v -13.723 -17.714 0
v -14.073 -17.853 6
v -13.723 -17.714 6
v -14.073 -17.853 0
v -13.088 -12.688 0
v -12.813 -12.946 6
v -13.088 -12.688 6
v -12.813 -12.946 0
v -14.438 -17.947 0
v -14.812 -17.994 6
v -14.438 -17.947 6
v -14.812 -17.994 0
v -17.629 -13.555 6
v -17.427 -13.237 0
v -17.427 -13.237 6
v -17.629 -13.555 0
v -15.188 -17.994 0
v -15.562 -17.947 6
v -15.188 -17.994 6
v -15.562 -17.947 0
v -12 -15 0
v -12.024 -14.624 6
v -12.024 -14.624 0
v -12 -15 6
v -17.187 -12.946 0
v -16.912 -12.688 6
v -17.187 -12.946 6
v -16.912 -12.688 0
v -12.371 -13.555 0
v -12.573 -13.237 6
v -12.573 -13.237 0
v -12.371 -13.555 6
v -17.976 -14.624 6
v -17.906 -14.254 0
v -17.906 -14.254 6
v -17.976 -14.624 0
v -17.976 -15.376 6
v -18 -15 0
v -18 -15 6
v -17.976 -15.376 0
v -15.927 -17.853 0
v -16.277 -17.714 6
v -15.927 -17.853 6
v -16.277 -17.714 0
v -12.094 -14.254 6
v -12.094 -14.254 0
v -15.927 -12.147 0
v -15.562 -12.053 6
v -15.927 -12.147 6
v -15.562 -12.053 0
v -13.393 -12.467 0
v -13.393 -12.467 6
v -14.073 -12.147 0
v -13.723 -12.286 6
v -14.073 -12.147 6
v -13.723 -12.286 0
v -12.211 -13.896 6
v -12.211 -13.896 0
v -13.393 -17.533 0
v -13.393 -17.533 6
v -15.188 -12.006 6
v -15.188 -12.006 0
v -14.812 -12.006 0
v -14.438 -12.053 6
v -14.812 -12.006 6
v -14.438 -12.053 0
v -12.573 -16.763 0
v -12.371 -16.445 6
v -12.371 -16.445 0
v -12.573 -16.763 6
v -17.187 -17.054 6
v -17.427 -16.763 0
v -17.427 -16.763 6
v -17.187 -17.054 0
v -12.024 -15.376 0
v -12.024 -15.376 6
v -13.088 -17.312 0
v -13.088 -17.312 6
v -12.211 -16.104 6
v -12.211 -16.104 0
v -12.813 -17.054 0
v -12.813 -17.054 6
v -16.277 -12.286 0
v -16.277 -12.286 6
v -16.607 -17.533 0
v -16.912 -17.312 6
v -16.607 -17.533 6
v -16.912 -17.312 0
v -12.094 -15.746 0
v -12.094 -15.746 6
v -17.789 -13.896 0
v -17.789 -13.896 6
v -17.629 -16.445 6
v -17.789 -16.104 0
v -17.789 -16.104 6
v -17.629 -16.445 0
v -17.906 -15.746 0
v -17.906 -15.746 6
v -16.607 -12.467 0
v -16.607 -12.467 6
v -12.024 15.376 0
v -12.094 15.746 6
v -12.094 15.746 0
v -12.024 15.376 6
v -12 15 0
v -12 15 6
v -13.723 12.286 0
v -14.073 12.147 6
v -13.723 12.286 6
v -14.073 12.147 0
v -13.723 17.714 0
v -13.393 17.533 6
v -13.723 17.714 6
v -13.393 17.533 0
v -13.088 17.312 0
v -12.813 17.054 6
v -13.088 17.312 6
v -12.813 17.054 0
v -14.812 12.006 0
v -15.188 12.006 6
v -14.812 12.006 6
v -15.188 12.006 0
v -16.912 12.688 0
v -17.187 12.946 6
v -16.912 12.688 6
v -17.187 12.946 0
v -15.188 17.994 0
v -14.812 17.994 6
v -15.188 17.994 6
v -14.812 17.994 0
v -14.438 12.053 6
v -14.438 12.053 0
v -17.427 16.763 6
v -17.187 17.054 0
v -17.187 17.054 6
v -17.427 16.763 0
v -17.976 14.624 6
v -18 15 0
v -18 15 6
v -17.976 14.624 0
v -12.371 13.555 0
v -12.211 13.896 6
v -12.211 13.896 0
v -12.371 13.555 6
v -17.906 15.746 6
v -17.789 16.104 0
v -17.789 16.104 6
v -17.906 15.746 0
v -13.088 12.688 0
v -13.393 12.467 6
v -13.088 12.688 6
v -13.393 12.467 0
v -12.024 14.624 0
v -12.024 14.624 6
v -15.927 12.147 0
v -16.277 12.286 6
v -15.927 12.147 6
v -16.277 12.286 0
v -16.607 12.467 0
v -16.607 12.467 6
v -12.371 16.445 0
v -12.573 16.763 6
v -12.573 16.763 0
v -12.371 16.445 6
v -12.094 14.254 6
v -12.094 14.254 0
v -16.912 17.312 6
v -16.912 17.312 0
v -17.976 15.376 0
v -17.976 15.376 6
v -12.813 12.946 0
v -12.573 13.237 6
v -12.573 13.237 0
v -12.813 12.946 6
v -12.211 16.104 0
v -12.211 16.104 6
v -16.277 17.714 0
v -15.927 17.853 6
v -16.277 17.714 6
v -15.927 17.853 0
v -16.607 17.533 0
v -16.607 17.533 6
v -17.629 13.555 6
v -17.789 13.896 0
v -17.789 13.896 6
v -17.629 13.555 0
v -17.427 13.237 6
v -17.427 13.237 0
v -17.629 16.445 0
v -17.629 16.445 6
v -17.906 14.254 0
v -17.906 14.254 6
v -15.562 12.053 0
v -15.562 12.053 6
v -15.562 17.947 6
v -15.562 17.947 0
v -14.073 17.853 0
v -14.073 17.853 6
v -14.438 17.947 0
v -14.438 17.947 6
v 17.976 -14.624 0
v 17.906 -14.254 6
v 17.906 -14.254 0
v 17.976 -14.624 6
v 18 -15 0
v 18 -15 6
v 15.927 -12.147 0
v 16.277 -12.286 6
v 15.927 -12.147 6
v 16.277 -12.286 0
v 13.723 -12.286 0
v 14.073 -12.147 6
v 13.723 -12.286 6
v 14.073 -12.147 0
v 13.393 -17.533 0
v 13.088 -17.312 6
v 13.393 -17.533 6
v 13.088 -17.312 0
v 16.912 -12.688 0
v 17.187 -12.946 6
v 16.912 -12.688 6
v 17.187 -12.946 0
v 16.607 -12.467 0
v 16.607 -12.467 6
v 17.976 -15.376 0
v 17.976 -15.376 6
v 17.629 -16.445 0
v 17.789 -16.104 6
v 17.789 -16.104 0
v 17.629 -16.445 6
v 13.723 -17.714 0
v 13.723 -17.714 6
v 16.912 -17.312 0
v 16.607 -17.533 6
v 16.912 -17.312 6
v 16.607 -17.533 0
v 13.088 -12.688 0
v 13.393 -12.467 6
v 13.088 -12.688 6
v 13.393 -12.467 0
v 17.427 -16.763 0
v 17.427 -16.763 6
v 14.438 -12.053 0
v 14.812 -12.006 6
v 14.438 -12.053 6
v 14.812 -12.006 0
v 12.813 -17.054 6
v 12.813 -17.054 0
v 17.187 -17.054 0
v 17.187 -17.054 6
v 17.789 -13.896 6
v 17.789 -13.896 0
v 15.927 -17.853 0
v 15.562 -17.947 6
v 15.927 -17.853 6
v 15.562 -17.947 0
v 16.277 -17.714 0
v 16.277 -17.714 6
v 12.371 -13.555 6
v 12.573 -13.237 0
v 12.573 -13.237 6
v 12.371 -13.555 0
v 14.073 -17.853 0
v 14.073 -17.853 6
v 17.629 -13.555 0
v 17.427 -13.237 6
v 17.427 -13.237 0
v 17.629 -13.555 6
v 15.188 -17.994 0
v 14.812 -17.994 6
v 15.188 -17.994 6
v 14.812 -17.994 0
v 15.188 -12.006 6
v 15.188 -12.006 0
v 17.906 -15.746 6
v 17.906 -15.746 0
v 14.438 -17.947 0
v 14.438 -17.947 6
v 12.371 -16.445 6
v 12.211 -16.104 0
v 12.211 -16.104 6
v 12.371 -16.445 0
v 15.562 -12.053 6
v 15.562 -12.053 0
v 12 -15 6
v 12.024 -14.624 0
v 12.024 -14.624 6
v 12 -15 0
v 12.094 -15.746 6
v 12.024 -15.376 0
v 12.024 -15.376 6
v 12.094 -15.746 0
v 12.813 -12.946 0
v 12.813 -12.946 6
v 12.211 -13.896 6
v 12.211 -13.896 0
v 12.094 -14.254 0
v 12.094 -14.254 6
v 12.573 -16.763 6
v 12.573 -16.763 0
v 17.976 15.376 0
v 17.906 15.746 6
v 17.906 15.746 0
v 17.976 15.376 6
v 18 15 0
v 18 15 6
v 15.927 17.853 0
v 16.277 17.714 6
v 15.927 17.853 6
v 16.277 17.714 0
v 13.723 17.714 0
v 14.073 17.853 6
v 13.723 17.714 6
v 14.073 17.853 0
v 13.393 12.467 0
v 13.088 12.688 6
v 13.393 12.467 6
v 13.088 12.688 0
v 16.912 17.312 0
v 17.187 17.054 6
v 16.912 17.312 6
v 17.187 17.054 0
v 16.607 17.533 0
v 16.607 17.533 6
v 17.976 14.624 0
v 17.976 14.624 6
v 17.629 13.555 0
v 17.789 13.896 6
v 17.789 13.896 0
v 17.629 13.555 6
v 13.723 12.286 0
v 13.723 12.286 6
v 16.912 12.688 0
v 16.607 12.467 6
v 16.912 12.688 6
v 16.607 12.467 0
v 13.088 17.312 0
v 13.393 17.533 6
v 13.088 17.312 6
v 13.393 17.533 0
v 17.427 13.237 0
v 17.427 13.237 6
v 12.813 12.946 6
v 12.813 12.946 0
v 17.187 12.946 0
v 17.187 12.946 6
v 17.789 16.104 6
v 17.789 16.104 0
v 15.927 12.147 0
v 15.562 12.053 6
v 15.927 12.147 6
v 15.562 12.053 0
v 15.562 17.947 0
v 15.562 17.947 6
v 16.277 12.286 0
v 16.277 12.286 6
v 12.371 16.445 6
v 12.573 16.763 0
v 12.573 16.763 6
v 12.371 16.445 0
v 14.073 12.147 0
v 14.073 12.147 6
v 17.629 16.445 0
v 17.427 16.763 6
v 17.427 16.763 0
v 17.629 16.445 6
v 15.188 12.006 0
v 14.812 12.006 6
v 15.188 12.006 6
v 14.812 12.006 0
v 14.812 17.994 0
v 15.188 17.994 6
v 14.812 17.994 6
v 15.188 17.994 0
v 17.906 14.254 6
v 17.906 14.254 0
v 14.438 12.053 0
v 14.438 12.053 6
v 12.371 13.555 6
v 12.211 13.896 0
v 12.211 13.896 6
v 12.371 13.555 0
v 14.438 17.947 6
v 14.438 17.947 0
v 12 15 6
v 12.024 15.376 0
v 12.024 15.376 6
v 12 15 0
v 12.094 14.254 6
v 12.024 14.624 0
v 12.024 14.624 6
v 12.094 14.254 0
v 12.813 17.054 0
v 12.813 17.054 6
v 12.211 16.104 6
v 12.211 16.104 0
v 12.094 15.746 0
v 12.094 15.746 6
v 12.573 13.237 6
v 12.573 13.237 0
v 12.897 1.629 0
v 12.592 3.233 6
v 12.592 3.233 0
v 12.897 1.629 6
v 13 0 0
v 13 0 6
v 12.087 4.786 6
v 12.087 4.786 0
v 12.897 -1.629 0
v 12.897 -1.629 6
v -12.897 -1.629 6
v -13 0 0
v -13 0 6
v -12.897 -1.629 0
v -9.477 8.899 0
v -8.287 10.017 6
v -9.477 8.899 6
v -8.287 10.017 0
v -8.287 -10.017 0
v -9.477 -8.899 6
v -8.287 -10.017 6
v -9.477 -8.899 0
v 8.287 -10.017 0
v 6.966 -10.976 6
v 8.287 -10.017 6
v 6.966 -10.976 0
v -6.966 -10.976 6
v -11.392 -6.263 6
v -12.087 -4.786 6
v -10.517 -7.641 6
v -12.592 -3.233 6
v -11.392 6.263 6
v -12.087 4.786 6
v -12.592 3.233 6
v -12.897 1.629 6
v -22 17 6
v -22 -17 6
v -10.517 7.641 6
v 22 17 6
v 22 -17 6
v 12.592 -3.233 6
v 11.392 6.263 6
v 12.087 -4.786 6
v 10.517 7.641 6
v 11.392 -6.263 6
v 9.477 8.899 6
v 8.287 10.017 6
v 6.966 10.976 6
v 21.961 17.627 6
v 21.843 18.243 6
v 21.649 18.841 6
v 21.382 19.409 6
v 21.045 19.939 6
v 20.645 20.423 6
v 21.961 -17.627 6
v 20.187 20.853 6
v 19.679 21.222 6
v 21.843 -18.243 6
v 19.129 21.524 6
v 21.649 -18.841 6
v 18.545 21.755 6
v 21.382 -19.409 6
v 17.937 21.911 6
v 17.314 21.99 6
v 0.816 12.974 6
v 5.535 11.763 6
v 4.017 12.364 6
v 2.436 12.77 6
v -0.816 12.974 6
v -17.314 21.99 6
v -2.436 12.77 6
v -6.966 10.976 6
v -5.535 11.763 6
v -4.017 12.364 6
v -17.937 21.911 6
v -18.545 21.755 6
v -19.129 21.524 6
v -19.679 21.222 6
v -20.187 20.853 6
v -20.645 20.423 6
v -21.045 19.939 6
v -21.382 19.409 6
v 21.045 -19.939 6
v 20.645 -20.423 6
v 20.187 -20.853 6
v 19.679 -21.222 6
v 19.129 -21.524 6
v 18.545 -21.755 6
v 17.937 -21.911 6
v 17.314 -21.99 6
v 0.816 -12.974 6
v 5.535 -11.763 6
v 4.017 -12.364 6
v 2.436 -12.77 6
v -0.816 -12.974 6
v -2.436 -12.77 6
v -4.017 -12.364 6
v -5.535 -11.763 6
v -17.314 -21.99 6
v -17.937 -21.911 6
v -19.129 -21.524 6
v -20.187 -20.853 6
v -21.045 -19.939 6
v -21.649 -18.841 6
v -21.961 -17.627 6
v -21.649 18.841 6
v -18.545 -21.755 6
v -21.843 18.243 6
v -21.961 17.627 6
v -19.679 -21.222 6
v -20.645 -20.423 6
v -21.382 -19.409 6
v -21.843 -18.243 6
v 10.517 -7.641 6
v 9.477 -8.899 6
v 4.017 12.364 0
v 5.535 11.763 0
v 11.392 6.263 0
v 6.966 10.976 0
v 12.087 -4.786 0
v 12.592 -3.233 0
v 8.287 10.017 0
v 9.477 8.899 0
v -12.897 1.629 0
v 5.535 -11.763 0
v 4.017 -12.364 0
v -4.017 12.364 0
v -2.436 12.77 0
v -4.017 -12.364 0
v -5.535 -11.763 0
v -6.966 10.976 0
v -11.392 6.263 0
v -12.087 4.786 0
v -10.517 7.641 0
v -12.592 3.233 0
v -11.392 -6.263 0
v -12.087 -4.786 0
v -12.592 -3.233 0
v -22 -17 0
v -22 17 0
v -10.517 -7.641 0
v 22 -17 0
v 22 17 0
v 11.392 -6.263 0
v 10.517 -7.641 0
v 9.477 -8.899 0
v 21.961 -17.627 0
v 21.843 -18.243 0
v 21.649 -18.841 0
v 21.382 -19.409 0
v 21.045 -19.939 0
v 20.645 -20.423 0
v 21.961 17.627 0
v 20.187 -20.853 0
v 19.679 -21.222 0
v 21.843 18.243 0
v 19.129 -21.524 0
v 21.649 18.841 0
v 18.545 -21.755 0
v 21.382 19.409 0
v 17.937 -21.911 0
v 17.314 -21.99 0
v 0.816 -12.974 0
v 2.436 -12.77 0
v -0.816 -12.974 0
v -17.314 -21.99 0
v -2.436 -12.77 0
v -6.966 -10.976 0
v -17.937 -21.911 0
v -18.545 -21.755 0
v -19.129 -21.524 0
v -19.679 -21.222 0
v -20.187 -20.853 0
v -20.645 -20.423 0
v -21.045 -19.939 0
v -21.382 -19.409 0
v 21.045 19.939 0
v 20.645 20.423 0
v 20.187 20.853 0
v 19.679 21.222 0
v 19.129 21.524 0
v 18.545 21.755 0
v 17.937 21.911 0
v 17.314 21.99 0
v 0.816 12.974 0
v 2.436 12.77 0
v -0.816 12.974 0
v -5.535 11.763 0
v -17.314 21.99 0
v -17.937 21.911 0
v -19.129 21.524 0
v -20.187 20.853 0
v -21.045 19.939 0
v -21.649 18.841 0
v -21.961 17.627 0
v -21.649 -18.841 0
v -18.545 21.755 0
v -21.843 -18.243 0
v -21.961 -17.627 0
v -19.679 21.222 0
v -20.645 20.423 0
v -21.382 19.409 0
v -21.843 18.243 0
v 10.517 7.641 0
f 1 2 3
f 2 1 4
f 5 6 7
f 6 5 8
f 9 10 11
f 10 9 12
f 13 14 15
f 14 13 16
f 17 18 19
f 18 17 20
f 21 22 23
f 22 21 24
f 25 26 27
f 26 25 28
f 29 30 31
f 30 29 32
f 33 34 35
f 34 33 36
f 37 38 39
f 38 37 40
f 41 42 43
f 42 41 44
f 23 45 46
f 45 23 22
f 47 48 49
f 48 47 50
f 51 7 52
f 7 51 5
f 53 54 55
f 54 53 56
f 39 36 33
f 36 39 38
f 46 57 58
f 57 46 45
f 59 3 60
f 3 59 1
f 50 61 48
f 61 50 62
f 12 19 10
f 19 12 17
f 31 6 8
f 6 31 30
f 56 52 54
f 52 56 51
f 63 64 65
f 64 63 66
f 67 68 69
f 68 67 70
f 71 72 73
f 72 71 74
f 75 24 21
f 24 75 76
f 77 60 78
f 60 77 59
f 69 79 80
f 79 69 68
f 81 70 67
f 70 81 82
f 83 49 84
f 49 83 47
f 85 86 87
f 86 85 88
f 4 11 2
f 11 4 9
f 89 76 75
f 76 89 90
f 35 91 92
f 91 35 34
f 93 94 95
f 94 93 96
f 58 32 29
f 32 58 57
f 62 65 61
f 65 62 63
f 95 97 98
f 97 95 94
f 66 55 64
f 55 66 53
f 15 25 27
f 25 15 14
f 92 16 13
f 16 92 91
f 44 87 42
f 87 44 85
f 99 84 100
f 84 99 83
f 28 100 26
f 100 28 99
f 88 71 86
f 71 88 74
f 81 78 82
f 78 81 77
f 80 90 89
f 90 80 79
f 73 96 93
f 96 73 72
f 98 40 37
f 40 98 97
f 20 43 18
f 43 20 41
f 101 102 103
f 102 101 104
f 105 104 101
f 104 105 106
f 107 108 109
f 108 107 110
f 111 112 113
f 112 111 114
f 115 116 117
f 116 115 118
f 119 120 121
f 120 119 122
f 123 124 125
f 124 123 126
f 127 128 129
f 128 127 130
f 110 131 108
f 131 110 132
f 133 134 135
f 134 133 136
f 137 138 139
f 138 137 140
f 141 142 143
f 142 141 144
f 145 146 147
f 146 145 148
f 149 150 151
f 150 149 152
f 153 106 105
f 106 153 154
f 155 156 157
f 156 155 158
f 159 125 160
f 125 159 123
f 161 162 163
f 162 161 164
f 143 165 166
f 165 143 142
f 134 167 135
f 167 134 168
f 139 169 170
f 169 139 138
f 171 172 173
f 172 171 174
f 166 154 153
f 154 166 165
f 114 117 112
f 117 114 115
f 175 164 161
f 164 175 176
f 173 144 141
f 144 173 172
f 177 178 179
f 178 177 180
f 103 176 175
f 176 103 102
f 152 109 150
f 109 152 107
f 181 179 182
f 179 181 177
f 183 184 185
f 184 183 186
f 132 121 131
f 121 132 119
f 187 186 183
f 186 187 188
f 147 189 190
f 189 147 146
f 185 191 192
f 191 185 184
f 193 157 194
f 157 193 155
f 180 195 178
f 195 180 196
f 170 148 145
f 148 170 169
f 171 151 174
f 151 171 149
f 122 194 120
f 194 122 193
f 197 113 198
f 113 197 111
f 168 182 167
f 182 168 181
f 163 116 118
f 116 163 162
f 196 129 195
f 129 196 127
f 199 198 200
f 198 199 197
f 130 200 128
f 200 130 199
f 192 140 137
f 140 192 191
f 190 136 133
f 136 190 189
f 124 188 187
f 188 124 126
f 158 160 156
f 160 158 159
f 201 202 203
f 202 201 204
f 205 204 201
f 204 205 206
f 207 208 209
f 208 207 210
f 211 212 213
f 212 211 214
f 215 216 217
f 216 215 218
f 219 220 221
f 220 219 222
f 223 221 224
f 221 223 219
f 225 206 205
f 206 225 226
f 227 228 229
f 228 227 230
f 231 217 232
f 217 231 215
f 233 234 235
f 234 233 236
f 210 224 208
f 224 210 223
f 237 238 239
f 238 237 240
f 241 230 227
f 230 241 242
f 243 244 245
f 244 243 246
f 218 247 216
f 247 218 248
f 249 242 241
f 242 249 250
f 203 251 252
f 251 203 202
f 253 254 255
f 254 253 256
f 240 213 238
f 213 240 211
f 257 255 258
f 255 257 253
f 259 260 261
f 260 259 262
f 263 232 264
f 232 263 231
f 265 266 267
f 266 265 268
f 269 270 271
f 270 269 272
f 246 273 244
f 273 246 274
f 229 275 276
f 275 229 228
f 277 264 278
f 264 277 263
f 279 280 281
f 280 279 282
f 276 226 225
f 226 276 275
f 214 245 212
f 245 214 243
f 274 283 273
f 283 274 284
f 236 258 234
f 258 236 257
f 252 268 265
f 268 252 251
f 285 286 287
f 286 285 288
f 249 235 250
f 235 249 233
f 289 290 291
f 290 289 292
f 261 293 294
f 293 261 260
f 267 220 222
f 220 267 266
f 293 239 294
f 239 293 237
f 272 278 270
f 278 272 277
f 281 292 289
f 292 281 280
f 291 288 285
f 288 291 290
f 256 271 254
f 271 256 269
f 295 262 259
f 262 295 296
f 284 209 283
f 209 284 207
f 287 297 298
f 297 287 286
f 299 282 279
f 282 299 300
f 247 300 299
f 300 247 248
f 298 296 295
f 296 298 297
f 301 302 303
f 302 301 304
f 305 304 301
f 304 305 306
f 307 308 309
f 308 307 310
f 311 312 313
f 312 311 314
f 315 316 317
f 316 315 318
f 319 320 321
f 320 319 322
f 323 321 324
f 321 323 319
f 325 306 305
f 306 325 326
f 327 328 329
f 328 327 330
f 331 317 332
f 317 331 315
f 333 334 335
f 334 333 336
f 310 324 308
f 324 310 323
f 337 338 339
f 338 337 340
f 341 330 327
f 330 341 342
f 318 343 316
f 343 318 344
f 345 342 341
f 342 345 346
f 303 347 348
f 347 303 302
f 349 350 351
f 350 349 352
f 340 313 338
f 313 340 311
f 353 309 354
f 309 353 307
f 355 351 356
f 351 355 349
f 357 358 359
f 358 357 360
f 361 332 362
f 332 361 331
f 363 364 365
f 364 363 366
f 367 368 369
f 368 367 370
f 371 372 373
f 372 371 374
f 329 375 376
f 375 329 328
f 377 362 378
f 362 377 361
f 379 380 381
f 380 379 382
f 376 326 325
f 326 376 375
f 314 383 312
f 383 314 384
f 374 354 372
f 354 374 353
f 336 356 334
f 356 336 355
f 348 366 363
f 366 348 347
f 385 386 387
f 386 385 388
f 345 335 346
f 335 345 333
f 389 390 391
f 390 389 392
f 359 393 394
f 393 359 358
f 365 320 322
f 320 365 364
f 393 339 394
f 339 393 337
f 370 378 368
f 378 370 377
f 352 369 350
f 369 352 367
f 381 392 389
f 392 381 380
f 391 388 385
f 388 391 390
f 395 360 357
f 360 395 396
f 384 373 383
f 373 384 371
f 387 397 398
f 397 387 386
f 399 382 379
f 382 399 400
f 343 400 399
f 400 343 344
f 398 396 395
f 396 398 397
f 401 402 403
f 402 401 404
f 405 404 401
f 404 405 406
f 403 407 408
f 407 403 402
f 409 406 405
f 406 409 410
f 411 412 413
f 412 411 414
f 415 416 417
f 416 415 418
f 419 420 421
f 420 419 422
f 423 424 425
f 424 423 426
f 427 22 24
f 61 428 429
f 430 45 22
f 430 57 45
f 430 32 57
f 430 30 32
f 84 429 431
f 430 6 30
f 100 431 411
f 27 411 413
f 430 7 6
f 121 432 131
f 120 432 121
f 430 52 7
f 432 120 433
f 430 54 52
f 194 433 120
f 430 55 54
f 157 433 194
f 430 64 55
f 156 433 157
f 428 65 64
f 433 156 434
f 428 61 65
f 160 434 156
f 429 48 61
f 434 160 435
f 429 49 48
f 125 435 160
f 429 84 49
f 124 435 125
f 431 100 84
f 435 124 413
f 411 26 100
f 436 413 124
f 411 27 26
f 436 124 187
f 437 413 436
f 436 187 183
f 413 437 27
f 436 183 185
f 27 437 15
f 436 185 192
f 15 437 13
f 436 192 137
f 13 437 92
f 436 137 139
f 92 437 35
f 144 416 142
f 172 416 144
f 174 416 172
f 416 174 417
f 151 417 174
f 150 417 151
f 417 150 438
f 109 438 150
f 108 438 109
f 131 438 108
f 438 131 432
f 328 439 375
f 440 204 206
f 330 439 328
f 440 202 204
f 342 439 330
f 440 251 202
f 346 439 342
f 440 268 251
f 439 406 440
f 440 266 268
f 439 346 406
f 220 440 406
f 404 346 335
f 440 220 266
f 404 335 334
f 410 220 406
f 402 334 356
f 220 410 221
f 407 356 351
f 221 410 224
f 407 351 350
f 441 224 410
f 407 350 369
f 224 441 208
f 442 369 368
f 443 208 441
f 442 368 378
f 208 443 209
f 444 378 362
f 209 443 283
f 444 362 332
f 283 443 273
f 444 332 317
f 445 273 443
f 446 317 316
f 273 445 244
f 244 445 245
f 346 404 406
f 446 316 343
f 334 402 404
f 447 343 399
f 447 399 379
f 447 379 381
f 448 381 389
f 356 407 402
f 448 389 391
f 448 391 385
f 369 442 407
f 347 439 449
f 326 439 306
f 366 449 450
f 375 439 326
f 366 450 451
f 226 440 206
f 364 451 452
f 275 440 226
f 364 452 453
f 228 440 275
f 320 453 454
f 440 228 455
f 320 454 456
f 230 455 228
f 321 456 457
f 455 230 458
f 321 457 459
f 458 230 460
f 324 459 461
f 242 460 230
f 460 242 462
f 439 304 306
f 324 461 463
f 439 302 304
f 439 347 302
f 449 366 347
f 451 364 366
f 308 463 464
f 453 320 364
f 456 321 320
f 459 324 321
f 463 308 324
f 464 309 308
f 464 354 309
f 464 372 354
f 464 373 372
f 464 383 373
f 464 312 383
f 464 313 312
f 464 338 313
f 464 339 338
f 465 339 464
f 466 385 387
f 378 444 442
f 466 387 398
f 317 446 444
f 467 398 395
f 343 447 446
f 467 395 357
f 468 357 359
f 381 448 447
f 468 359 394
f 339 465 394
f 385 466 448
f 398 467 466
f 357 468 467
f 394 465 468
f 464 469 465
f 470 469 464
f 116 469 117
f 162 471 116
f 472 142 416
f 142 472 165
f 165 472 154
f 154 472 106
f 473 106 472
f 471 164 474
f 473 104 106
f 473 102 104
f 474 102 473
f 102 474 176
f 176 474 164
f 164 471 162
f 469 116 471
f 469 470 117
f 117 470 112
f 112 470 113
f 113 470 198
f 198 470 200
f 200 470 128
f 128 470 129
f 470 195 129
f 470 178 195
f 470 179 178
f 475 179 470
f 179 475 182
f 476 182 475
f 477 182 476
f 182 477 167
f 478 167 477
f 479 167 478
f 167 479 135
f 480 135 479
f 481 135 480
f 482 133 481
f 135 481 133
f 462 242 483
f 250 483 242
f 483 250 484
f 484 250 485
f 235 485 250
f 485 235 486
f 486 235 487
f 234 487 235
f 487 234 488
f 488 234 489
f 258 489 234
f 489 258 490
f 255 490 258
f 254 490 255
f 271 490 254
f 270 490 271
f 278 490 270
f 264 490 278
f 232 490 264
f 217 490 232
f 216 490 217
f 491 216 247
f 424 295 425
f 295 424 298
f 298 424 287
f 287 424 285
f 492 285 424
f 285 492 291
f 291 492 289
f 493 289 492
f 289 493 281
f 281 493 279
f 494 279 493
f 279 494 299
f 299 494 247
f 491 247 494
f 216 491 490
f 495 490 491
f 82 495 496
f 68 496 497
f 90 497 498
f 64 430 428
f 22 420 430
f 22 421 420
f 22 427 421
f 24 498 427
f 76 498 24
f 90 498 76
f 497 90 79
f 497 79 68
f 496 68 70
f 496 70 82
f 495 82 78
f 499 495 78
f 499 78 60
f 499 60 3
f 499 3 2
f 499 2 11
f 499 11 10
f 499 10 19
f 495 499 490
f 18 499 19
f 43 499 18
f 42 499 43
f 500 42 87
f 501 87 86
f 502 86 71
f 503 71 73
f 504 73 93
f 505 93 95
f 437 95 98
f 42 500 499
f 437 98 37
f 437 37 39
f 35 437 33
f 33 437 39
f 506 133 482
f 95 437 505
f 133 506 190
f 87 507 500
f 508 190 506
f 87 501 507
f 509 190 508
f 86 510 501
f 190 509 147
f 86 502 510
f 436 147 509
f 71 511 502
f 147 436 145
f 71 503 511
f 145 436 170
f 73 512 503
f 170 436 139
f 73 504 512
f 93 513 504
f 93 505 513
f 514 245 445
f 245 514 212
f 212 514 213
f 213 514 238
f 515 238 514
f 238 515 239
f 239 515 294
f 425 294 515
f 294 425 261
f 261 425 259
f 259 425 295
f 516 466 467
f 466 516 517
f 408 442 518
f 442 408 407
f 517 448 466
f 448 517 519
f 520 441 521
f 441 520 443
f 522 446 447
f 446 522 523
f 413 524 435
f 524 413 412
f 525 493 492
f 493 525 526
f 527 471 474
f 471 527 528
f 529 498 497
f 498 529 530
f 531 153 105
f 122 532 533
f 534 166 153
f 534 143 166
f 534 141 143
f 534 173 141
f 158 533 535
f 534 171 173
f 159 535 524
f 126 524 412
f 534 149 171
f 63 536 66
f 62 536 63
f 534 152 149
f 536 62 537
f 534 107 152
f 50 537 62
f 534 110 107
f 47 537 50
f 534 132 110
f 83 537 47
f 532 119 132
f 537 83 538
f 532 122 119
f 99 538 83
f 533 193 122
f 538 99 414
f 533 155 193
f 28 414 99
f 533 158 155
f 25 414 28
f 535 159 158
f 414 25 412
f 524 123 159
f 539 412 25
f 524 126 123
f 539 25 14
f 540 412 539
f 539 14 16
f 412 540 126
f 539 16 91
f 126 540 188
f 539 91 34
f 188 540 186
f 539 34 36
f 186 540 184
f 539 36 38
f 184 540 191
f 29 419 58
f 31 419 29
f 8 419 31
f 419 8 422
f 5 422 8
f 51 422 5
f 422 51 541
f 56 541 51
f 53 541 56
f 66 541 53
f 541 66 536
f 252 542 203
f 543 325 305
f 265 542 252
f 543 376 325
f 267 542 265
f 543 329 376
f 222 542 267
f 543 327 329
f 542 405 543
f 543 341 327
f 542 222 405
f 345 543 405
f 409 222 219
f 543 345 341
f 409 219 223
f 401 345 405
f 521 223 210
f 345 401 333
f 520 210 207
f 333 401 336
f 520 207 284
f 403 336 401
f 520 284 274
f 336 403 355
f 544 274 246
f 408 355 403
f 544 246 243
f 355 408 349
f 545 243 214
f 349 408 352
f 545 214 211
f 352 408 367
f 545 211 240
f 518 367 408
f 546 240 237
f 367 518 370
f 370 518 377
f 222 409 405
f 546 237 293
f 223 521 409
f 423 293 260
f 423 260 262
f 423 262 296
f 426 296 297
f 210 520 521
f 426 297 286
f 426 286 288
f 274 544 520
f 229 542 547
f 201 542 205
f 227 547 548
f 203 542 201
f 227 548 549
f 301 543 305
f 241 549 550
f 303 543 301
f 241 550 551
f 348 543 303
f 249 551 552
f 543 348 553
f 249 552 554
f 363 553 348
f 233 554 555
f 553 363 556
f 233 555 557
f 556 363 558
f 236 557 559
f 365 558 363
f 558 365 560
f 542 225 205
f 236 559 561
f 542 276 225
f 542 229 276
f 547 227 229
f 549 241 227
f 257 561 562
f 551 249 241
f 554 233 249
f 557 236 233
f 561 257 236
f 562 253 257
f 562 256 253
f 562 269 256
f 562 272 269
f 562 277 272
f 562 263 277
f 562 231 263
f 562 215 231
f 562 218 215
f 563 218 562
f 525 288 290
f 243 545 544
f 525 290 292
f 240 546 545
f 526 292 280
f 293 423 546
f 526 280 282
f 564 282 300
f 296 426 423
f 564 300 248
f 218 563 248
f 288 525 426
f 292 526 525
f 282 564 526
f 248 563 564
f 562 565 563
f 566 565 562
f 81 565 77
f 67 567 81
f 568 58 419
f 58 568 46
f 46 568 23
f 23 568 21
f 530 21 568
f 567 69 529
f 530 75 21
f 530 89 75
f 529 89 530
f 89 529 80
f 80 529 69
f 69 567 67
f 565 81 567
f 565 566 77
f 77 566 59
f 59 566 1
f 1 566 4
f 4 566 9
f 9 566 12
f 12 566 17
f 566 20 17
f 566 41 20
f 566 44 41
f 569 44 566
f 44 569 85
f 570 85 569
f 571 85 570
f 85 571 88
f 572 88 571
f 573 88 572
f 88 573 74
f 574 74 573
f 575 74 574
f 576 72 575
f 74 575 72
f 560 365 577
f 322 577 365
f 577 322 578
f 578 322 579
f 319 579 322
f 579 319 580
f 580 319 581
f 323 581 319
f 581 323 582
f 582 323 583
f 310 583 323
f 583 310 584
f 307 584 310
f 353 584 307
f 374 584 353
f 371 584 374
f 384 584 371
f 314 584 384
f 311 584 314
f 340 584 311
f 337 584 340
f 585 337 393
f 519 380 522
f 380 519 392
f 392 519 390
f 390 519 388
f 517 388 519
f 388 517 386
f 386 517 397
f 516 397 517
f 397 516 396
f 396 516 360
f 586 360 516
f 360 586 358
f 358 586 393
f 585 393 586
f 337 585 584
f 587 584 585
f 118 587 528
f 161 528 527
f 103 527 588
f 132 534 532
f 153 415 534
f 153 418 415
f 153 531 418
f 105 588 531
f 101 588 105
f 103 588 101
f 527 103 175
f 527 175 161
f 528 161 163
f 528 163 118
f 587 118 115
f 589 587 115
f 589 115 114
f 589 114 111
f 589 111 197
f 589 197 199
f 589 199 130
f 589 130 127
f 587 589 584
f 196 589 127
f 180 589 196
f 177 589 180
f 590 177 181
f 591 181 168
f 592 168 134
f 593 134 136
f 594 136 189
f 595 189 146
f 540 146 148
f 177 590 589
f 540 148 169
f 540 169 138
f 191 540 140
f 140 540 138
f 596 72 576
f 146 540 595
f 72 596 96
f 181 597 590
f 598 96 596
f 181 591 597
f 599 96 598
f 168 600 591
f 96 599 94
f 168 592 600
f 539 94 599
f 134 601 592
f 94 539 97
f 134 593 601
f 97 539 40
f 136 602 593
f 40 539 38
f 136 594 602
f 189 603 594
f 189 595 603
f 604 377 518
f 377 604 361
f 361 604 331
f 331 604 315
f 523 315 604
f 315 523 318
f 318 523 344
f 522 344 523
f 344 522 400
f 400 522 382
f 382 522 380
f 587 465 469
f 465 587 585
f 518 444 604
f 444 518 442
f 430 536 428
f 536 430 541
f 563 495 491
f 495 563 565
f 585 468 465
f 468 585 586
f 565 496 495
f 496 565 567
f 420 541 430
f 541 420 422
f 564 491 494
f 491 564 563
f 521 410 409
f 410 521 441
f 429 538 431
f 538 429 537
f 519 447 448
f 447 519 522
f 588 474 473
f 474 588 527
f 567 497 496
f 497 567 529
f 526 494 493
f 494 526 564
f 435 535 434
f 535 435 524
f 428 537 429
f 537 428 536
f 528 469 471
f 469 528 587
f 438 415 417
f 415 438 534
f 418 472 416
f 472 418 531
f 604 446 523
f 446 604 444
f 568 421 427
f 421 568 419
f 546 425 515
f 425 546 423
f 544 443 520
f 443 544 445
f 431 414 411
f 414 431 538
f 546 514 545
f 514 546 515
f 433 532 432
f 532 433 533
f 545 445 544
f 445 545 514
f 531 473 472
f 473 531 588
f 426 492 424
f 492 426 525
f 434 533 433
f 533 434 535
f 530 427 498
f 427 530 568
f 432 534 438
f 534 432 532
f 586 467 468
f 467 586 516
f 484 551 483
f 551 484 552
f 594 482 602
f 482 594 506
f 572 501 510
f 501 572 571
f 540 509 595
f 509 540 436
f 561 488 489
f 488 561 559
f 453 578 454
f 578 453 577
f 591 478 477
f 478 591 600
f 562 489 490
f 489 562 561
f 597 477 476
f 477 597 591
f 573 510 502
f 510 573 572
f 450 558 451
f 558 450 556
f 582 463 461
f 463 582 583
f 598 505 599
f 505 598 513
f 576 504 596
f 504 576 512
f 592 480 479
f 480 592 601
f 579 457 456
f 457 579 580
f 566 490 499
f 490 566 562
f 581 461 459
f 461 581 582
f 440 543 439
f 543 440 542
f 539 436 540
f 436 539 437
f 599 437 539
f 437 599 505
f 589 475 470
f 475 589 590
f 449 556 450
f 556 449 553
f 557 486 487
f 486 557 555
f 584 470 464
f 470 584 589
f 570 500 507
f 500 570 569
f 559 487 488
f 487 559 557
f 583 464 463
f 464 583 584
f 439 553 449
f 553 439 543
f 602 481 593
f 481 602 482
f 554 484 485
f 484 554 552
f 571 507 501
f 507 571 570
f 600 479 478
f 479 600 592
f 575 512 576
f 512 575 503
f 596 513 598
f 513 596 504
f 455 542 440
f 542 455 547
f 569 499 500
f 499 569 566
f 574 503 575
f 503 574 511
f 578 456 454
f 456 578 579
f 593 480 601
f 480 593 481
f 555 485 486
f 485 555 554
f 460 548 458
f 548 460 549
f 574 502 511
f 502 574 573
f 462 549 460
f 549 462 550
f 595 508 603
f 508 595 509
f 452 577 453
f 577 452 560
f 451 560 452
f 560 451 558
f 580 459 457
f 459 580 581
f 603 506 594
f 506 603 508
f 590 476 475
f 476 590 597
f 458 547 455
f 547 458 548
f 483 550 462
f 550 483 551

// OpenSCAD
$fn = 50;


difference() {
	union() {
		hull() {
			translate(v = [-17.0000000000, 17.0000000000, 0]) {
				cylinder(h = 6, r = 5);
			}
			translate(v = [17.0000000000, 17.0000000000, 0]) {
				cylinder(h = 6, r = 5);
			}
			translate(v = [-17.0000000000, -17.0000000000, 0]) {
				cylinder(h = 6, r = 5);
			}
			translate(v = [17.0000000000, -17.0000000000, 0]) {
				cylinder(h = 6, r = 5);
			}
		}
	}
	union() {
		#translate(v = [-15.0000000000, -15.0000000000, -100.0000000000]) {
			cylinder(h = 200, r = 3.0000000000);
		}
		#translate(v = [-15.0000000000, 15.0000000000, -100.0000000000]) {
			cylinder(h = 200, r = 3.0000000000);
		}
		#translate(v = [15.0000000000, -15.0000000000, -100.0000000000]) {
			cylinder(h = 200, r = 3.0000000000);
		}
		#translate(v = [15.0000000000, 15.0000000000, -100.0000000000]) {
			cylinder(h = 200, r = 3.0000000000);
		}
		#cylinder(h = 6, r = 13.0000000000);
	}
}
